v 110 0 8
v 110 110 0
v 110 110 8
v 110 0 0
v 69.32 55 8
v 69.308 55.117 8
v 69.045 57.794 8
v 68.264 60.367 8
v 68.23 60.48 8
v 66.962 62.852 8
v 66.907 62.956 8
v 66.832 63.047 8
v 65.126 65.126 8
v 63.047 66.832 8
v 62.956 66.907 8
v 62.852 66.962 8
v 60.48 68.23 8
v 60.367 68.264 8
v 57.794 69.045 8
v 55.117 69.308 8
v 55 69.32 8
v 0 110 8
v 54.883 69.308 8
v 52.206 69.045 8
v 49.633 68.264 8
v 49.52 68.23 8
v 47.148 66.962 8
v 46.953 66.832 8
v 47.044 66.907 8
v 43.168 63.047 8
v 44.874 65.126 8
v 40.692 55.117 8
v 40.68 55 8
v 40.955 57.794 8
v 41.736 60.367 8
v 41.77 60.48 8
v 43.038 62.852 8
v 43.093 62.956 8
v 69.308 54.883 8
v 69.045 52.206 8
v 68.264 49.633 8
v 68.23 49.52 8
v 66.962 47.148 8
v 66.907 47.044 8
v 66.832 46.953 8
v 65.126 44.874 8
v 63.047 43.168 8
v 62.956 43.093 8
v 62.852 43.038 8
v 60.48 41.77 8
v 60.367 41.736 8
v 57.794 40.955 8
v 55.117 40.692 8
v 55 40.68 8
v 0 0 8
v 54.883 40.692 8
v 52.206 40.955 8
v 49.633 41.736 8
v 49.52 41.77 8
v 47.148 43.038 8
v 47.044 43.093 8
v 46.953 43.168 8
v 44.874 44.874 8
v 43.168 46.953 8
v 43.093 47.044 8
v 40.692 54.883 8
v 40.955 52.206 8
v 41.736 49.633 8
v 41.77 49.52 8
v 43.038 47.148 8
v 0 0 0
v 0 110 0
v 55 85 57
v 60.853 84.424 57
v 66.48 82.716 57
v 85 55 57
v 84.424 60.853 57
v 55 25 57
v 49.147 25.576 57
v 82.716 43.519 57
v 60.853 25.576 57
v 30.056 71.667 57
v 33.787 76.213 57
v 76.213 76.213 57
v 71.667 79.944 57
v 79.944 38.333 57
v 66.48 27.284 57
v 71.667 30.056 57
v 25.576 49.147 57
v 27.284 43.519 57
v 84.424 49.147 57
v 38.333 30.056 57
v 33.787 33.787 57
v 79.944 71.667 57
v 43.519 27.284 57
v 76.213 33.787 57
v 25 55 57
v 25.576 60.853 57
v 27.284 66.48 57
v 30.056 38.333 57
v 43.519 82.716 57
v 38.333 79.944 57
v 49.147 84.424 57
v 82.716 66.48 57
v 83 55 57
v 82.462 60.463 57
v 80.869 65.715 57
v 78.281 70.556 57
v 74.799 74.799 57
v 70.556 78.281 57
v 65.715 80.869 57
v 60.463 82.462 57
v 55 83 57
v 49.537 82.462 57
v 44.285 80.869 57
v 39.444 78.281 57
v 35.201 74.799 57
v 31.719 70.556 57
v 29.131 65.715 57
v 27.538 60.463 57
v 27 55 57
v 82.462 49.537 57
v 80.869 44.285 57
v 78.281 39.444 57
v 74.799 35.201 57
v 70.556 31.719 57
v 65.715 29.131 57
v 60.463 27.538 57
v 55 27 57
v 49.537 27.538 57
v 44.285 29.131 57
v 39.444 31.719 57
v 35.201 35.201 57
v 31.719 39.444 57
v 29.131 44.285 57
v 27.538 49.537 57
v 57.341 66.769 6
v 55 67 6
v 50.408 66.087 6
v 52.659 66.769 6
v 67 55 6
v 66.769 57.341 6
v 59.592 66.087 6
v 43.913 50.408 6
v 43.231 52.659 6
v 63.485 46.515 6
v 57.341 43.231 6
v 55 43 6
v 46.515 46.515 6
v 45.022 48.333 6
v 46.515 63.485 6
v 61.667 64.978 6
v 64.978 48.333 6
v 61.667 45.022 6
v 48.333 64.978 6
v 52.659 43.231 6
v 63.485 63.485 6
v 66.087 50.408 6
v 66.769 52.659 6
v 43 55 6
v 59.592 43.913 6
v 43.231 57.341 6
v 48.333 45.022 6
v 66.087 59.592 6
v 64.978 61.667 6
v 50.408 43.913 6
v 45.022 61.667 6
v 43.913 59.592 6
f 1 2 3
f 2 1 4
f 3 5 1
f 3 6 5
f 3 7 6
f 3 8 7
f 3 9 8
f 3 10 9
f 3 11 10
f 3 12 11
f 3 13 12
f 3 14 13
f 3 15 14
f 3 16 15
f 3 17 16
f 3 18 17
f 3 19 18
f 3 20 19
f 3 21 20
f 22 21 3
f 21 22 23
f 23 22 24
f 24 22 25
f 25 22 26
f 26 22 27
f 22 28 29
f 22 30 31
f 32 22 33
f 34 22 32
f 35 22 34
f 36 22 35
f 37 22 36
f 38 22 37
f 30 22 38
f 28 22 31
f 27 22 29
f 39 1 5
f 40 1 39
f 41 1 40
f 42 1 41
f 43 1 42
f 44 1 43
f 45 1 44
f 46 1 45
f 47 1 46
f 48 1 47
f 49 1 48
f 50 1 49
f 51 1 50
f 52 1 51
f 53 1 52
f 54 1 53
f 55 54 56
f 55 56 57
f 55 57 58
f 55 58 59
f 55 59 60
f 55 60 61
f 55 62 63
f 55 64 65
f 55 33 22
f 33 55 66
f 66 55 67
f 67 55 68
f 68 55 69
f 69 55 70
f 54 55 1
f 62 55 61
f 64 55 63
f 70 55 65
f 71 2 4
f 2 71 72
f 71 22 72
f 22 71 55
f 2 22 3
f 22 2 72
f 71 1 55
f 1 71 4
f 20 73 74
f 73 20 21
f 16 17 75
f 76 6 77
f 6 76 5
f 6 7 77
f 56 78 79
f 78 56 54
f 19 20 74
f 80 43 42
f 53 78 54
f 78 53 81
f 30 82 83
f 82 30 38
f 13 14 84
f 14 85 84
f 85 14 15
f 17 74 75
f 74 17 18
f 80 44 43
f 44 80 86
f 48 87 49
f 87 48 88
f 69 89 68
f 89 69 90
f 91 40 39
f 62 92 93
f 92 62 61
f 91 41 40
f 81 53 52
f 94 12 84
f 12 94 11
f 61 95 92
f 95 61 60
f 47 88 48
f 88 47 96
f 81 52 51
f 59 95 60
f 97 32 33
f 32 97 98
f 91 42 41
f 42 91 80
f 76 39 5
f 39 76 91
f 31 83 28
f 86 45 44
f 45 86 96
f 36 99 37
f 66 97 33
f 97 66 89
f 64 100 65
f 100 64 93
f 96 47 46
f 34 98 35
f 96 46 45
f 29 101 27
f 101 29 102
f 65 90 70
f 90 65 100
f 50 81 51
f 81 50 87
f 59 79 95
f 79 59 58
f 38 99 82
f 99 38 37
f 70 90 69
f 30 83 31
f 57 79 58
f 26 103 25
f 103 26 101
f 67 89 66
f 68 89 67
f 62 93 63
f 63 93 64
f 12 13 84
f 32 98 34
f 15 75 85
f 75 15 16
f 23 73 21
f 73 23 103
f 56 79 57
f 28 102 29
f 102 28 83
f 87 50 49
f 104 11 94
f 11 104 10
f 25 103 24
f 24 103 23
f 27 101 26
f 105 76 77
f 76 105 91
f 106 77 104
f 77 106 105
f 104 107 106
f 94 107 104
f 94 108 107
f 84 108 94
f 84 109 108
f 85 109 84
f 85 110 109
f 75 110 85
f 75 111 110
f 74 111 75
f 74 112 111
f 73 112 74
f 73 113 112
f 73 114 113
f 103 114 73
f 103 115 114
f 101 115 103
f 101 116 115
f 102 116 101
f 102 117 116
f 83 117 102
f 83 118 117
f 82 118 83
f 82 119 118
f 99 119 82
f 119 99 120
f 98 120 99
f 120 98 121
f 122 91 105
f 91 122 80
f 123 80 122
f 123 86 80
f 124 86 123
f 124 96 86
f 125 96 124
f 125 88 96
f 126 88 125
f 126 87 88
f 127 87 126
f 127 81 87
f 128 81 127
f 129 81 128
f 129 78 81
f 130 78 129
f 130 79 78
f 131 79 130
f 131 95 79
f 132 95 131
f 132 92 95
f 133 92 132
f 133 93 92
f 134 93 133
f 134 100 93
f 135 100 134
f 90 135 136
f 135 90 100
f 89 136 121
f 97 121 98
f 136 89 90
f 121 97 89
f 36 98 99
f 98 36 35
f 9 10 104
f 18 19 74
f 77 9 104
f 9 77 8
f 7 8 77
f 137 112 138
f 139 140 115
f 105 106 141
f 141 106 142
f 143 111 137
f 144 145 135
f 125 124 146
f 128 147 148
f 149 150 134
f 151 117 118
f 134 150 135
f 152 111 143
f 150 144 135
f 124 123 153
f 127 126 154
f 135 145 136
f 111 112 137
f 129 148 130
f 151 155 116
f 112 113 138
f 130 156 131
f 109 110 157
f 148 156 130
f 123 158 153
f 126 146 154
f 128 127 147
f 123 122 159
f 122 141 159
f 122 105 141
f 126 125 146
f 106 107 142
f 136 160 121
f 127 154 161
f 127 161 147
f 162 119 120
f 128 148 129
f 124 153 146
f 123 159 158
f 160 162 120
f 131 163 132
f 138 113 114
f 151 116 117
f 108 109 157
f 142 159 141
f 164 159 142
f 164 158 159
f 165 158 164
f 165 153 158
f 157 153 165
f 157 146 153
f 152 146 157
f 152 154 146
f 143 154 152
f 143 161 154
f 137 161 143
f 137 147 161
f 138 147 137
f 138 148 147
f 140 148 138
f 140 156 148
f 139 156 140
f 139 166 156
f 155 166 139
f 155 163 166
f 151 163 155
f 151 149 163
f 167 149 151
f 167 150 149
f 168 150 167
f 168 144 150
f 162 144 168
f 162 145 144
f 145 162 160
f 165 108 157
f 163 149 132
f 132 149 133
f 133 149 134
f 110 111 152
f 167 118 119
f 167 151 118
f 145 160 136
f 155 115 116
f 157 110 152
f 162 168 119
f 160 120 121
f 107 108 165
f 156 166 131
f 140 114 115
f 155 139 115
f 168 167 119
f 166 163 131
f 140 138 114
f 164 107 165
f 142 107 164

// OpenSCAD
$fn = 32;

// ----------------------------------------------------------------------
// Hopper: funnel with square flange
// ----------------------------------------------------------------------

// --- parameters (mm) ---
fl = 110;                 // flange side, X and Y
fl_t = 8;                 // flange thickness
cone_h = 50;              // cone height above the flange
top_d = 60;               // cone mouth diameter
bot_d = 28;               // cone spout diameter
wall = 2;                 // cone wall thickness

bore_d = bot_d - 2 * wall;  // spout bore diameter
total_h = fl_t + cone_h - 1;  // overall height

difference() {
  union() {
    cube([fl, fl, fl_t]);
    translate([fl / 2, fl / 2, fl_t - 1])
      cylinder(h = cone_h, d1 = bot_d, d2 = top_d);
  }
  translate([fl / 2, fl / 2, fl_t - 2])
    cylinder(h = cone_h + 1, d1 = bore_d, d2 = top_d - 2 * wall);
}
